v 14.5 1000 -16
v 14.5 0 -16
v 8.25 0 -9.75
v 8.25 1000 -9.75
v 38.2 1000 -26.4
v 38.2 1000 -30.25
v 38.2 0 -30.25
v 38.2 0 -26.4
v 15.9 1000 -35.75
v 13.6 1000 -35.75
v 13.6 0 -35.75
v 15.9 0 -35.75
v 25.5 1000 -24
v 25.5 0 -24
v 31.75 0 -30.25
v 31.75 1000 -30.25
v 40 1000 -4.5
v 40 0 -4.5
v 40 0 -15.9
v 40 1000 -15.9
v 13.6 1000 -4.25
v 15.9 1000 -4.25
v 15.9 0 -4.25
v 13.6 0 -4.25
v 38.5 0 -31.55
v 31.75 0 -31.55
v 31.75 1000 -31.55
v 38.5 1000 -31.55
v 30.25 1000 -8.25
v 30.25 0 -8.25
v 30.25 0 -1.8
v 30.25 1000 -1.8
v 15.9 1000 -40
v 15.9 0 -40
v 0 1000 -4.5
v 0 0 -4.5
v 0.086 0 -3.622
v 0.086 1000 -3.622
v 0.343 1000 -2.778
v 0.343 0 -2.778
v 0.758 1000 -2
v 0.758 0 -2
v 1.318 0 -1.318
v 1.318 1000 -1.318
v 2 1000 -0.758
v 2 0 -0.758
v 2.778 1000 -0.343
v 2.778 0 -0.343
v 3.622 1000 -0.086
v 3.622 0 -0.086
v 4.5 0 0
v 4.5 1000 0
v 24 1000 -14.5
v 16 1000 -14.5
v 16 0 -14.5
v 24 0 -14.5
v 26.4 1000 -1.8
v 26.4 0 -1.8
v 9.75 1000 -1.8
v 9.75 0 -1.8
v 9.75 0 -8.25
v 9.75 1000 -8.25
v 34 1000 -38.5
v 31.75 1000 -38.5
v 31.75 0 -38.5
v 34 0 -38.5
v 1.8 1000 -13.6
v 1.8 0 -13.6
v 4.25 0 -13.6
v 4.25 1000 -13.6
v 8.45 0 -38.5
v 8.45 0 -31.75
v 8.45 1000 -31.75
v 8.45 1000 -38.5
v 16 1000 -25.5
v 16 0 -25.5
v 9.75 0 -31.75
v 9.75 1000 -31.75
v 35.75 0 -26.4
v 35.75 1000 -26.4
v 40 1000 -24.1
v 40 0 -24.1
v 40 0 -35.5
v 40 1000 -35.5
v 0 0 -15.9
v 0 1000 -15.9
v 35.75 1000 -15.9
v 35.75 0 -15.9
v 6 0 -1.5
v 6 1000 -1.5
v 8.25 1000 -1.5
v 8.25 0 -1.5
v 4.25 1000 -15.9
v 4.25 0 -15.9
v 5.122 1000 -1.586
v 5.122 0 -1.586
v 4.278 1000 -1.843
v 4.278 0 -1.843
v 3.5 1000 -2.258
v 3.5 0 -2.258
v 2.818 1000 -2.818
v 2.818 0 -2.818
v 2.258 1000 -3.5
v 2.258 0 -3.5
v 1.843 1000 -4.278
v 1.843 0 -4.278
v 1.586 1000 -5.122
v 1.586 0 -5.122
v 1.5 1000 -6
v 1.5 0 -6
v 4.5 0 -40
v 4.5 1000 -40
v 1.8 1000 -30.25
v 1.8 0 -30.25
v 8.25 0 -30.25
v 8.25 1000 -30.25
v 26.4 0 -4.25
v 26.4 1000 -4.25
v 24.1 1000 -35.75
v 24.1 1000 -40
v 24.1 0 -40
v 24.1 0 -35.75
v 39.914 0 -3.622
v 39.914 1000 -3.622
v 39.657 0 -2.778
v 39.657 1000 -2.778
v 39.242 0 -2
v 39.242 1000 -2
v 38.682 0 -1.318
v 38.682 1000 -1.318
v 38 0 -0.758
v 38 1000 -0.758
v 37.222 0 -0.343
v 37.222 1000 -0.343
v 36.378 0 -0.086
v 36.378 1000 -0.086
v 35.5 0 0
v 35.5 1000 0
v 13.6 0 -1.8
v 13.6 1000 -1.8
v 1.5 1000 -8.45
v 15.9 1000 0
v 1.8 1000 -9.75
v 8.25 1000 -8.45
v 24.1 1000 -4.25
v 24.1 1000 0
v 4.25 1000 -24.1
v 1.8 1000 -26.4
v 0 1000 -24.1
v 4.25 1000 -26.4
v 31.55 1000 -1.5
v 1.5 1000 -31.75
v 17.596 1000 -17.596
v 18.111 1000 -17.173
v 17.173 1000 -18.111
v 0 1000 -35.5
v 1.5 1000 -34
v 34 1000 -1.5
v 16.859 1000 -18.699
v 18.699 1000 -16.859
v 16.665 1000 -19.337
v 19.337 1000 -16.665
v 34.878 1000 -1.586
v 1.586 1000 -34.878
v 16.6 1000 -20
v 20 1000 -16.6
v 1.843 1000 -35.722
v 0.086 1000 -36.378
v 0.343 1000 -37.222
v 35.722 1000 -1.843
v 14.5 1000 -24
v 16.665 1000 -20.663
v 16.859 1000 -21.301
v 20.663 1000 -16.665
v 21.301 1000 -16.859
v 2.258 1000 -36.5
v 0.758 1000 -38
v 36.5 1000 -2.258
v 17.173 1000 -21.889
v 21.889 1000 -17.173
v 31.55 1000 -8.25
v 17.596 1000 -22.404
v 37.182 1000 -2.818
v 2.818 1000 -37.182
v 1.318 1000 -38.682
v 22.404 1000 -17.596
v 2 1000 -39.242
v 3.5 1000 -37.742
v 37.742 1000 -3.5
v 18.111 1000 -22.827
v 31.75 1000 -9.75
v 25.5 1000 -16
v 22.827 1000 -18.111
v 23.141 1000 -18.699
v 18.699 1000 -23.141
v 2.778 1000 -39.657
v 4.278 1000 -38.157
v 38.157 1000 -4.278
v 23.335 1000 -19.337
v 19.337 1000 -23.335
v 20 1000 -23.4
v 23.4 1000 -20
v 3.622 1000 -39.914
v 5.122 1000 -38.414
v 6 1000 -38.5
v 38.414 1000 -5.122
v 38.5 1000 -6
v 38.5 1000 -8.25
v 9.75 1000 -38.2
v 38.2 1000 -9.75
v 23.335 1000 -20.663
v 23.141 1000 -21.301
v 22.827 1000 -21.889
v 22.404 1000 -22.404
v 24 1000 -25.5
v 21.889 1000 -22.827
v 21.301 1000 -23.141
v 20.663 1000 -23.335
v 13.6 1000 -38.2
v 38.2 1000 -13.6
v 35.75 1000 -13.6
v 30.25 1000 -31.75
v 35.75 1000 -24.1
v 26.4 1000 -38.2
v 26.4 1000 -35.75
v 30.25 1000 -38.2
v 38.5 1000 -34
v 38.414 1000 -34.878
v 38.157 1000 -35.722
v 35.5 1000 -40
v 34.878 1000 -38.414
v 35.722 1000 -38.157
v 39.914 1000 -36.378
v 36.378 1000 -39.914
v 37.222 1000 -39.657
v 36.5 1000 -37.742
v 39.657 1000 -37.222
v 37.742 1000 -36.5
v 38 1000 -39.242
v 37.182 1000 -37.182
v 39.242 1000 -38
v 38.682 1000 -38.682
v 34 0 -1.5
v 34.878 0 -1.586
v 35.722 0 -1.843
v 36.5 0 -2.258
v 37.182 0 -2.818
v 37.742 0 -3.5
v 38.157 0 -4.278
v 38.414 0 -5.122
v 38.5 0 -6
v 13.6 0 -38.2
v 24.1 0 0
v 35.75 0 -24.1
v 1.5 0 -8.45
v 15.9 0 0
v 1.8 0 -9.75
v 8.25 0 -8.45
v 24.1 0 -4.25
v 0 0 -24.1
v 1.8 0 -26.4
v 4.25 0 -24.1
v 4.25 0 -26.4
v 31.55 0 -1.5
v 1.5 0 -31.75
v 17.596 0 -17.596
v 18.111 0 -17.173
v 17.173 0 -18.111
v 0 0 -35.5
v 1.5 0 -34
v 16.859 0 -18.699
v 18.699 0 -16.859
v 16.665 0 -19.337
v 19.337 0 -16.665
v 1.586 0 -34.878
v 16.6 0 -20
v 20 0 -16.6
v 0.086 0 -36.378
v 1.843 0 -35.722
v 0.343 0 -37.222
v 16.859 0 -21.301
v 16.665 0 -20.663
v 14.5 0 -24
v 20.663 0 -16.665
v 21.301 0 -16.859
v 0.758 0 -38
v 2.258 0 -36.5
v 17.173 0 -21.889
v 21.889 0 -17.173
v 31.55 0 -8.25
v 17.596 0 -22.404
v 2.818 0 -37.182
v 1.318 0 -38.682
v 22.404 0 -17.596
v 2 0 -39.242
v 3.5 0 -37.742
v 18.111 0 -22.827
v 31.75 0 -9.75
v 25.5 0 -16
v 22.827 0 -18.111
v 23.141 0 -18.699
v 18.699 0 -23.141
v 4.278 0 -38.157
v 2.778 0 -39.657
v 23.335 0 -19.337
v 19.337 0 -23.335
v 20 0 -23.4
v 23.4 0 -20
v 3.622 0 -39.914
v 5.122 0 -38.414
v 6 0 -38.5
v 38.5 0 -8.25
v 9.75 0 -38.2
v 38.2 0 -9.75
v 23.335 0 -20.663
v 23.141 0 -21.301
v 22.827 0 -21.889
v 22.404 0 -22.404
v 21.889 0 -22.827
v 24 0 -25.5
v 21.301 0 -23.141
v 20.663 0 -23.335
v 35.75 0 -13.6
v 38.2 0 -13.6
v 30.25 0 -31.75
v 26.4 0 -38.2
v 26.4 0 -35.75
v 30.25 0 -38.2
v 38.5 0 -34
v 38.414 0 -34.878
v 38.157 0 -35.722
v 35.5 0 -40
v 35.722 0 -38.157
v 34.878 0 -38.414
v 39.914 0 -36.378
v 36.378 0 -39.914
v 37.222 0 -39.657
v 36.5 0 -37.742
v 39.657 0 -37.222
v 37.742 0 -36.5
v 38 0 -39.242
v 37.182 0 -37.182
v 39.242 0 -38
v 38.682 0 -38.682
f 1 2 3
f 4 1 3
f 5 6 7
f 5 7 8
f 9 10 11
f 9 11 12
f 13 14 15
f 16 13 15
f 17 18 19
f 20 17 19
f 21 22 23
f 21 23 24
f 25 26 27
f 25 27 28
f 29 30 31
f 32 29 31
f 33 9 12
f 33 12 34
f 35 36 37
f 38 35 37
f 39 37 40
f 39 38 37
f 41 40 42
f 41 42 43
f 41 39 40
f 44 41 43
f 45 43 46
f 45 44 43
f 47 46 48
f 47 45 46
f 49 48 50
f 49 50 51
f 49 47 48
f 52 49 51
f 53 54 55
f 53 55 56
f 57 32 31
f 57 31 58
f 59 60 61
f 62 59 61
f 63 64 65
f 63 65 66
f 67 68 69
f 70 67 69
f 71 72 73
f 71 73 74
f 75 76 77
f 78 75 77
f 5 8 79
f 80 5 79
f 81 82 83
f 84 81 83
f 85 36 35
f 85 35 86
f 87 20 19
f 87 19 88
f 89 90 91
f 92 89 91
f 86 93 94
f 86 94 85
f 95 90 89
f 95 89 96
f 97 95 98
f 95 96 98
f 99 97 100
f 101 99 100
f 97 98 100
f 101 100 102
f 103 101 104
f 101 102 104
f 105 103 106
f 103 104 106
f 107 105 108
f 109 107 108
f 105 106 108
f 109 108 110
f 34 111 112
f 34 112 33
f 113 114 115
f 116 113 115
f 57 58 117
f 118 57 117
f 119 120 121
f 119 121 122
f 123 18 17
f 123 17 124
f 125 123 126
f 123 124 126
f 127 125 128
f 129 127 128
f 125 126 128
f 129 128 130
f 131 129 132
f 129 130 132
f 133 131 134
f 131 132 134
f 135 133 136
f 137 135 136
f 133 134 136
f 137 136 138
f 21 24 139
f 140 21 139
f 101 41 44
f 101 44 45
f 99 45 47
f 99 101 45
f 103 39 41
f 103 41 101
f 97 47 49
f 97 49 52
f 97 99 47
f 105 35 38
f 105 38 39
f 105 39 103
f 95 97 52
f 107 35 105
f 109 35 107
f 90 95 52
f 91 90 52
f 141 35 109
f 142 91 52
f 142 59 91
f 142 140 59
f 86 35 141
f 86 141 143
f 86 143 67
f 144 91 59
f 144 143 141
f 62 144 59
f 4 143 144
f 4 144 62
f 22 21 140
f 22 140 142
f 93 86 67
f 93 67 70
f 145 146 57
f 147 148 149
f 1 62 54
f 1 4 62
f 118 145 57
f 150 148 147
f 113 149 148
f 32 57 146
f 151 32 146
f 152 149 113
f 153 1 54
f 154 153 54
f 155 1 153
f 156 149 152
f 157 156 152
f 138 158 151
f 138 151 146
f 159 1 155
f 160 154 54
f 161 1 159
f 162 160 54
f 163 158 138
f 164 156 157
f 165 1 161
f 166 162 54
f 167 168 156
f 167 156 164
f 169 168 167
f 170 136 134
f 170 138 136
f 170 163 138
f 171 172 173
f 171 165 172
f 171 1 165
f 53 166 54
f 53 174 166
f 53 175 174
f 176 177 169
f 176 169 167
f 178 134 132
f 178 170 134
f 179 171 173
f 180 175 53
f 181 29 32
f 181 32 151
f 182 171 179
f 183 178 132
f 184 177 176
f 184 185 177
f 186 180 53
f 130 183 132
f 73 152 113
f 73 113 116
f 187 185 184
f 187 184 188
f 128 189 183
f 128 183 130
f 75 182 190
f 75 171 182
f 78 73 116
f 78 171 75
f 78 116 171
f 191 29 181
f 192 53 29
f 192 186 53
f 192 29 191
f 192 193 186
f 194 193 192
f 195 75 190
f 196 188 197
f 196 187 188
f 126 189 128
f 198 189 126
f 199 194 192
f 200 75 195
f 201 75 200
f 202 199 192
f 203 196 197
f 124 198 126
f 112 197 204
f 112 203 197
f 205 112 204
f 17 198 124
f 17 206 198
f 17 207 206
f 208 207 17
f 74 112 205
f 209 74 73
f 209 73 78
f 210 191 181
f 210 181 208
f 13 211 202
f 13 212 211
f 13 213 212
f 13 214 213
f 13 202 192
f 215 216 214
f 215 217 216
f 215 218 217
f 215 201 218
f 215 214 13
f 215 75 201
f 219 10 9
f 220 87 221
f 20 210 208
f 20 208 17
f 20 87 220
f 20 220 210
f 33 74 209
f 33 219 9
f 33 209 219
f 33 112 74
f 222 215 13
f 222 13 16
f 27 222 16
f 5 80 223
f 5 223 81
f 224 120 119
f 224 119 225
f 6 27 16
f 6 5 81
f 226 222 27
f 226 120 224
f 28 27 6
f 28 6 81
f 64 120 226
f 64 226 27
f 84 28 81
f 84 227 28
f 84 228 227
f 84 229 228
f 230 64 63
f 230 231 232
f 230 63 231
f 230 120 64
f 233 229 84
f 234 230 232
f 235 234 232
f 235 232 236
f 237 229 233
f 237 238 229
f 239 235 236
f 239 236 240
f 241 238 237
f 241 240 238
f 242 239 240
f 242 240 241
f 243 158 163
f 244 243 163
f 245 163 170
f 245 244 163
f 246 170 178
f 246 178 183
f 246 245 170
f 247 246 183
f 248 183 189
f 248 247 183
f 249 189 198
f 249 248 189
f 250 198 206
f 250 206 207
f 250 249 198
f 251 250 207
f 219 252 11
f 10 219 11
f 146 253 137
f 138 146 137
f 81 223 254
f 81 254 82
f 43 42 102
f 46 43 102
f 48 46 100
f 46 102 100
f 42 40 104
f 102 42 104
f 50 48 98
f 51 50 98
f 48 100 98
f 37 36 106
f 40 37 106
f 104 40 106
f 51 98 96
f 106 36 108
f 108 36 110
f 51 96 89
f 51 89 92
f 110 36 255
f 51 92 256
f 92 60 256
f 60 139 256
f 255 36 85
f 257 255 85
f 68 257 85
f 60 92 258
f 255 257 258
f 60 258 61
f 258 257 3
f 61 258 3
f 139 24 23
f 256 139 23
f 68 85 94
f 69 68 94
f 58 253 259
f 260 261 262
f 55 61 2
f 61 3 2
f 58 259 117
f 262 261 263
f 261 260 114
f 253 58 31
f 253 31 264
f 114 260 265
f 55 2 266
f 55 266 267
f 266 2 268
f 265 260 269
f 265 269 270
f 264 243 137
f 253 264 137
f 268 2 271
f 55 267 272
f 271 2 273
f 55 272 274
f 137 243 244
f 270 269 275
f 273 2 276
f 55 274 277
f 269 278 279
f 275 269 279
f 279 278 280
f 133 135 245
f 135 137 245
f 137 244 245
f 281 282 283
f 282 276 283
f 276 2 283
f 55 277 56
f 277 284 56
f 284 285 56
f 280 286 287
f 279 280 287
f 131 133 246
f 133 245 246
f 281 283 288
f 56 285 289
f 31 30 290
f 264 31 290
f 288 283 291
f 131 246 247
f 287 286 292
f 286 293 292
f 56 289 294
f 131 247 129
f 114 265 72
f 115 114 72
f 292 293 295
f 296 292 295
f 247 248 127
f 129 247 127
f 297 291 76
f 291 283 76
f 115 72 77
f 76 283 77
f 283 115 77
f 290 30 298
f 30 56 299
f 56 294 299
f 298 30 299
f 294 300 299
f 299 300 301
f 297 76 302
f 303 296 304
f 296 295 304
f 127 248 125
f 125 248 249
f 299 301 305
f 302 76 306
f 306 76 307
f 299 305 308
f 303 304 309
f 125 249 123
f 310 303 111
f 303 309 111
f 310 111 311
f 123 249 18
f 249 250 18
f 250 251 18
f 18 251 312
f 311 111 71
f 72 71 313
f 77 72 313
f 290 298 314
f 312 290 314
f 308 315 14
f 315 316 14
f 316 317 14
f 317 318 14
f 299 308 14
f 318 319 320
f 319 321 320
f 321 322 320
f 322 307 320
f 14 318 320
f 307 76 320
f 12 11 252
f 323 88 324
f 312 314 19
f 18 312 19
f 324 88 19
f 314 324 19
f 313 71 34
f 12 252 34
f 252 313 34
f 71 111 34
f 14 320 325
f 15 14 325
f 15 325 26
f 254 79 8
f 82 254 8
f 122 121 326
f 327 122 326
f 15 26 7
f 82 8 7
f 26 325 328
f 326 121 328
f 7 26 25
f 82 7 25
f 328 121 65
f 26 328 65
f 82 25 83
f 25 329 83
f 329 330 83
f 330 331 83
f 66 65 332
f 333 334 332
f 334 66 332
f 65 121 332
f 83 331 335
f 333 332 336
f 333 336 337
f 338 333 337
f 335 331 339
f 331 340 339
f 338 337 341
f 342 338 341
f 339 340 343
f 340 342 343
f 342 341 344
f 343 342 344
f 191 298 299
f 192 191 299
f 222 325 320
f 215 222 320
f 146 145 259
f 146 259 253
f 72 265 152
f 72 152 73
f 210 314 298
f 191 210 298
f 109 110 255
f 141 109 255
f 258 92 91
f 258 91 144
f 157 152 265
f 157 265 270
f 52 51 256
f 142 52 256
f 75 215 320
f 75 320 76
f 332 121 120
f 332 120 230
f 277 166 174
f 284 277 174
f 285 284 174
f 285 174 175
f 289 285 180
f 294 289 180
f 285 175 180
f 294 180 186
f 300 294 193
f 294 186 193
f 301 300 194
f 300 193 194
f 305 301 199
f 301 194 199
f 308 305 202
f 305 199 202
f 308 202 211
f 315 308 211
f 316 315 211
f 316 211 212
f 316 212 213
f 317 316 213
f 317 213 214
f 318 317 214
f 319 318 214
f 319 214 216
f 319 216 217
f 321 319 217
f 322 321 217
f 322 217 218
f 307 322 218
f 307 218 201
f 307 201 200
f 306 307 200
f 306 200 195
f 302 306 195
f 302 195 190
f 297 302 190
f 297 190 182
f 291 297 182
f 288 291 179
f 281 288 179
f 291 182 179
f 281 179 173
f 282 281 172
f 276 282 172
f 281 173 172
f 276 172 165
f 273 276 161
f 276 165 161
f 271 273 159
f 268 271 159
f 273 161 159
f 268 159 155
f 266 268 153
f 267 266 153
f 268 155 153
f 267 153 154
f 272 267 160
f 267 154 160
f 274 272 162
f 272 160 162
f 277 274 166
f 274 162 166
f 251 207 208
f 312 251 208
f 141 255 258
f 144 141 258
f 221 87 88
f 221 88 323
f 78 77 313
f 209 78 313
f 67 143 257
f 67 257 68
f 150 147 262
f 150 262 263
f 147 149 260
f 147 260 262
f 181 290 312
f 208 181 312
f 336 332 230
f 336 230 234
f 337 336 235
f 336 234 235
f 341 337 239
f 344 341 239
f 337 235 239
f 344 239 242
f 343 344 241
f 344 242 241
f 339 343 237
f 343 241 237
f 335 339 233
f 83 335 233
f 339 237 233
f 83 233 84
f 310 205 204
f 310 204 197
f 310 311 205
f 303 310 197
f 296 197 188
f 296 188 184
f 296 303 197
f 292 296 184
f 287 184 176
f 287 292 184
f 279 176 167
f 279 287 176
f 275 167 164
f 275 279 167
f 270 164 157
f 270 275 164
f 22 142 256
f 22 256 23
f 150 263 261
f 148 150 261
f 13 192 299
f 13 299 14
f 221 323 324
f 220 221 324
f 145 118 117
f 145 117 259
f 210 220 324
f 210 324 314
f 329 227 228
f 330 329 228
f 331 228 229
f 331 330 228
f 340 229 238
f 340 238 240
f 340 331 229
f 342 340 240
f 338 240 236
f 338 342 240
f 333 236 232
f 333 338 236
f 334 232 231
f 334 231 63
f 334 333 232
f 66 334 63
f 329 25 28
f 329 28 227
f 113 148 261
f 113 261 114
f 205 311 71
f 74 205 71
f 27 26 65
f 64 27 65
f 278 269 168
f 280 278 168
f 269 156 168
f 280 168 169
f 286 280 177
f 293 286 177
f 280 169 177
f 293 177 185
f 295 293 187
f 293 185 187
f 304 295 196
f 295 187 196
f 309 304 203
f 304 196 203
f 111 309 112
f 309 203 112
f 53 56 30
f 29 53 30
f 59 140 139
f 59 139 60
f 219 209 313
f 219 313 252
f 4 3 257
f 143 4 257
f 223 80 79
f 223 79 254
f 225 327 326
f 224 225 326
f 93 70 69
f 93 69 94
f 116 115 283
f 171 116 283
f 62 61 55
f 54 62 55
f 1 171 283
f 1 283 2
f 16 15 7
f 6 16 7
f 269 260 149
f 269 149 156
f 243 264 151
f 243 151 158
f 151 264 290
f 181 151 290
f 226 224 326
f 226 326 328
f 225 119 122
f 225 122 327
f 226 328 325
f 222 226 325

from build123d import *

# Parameters (mm, degrees)
SKETCH1_W           = 40
SKETCH1_H           = 40
BOSS_EXTRUDE1_DEPTH = 1000
SKETCH2_R           = 3.4
SKETCH2_W           = 6.95
SKETCH2_H           = 6.75
SKETCH2_W_2         = 6.75
SKETCH2_H_2         = 6.95
CUT_EXTRUDE1_DEPTH  = 1002.598722044
FILLET1_R           = 4.5


with BuildPart() as part:
    # Sketch1 → Boss-Extrude1 (new body)
    with BuildSketch(Plane(origin=(0, 0, 0), x_dir=(1, 0, 0), z_dir=(0, 1, 0))):
        with Locations((20, 20)):
            Rectangle(SKETCH1_W, SKETCH1_H)
    extrude(amount=BOSS_EXTRUDE1_DEPTH)

    # Sketch2 → Cut-Extrude1 (cut, through all)
    with BuildSketch(Plane(origin=(0, 1000, 0), x_dir=(1, 0, 0), z_dir=(0, 1, 0))):
        with Locations(Location((20, 20, 0), (0, 0, 270))):
            Circle(SKETCH2_R)
        Polygon((30.25, 31.75), (24, 25.5), (16, 25.5), (9.75, 31.75), (9.75, 38.2), (13.6, 38.2), (13.6, 35.75), (15.9, 35.75), (15.9, 40), (24.1, 40), (24.1, 35.75), (26.4, 35.75), (26.4, 38.2), (30.25, 38.2), align=None)
        Polygon((31.75, 9.75), (25.5, 16), (25.5, 24), (31.75, 30.25), (38.2, 30.25), (38.2, 26.4), (35.75, 26.4), (35.75, 24.1), (40, 24.1), (40, 15.9), (35.75, 15.9), (35.75, 13.6), (38.2, 13.6), (38.2, 9.75), align=None)
        with Locations((4.975, 35.125)):
            Rectangle(SKETCH2_W, SKETCH2_H)
        with Locations((35.125, 35.025)):
            Rectangle(SKETCH2_W_2, SKETCH2_H_2)
        Polygon((9.75, 8.25), (16, 14.5), (24, 14.5), (30.25, 8.25), (30.25, 1.8), (26.4, 1.8), (26.4, 4.25), (24.1, 4.25), (24.1, 0), (15.9, 0), (15.9, 4.25), (13.6, 4.25), (13.6, 1.8), (9.75, 1.8), align=None)
        with Locations((35.025, 4.875)):
            Rectangle(SKETCH2_W, SKETCH2_H)
        Polygon((8.25, 30.25), (14.5, 24), (14.5, 16), (8.25, 9.75), (1.8, 9.75), (1.8, 13.6), (4.25, 13.6), (4.25, 15.9), (0, 15.9), (0, 24.1), (4.25, 24.1), (4.25, 26.4), (1.8, 26.4), (1.8, 30.25), align=None)
        with Locations((4.875, 4.975)):
            Rectangle(SKETCH2_W_2, SKETCH2_H_2)
    extrude(amount=-CUT_EXTRUDE1_DEPTH, mode=Mode.SUBTRACT)

    # Fillet1
    fillet1_edges = [part.edges().sort_by_distance(p)[0] for p in [
        (38.5, 500, -38.5),
        (1.5, 500, -1.5),
        (38.5, 500, -1.5),
        (0, 500, -40),
        (40, 500, -40),
        (40, 500, 0),
        (0, 500, 0),
        (1.5, 500, -38.5),
    ]]
    fillet(fillet1_edges, radius=FILLET1_R)


solid = part.part
